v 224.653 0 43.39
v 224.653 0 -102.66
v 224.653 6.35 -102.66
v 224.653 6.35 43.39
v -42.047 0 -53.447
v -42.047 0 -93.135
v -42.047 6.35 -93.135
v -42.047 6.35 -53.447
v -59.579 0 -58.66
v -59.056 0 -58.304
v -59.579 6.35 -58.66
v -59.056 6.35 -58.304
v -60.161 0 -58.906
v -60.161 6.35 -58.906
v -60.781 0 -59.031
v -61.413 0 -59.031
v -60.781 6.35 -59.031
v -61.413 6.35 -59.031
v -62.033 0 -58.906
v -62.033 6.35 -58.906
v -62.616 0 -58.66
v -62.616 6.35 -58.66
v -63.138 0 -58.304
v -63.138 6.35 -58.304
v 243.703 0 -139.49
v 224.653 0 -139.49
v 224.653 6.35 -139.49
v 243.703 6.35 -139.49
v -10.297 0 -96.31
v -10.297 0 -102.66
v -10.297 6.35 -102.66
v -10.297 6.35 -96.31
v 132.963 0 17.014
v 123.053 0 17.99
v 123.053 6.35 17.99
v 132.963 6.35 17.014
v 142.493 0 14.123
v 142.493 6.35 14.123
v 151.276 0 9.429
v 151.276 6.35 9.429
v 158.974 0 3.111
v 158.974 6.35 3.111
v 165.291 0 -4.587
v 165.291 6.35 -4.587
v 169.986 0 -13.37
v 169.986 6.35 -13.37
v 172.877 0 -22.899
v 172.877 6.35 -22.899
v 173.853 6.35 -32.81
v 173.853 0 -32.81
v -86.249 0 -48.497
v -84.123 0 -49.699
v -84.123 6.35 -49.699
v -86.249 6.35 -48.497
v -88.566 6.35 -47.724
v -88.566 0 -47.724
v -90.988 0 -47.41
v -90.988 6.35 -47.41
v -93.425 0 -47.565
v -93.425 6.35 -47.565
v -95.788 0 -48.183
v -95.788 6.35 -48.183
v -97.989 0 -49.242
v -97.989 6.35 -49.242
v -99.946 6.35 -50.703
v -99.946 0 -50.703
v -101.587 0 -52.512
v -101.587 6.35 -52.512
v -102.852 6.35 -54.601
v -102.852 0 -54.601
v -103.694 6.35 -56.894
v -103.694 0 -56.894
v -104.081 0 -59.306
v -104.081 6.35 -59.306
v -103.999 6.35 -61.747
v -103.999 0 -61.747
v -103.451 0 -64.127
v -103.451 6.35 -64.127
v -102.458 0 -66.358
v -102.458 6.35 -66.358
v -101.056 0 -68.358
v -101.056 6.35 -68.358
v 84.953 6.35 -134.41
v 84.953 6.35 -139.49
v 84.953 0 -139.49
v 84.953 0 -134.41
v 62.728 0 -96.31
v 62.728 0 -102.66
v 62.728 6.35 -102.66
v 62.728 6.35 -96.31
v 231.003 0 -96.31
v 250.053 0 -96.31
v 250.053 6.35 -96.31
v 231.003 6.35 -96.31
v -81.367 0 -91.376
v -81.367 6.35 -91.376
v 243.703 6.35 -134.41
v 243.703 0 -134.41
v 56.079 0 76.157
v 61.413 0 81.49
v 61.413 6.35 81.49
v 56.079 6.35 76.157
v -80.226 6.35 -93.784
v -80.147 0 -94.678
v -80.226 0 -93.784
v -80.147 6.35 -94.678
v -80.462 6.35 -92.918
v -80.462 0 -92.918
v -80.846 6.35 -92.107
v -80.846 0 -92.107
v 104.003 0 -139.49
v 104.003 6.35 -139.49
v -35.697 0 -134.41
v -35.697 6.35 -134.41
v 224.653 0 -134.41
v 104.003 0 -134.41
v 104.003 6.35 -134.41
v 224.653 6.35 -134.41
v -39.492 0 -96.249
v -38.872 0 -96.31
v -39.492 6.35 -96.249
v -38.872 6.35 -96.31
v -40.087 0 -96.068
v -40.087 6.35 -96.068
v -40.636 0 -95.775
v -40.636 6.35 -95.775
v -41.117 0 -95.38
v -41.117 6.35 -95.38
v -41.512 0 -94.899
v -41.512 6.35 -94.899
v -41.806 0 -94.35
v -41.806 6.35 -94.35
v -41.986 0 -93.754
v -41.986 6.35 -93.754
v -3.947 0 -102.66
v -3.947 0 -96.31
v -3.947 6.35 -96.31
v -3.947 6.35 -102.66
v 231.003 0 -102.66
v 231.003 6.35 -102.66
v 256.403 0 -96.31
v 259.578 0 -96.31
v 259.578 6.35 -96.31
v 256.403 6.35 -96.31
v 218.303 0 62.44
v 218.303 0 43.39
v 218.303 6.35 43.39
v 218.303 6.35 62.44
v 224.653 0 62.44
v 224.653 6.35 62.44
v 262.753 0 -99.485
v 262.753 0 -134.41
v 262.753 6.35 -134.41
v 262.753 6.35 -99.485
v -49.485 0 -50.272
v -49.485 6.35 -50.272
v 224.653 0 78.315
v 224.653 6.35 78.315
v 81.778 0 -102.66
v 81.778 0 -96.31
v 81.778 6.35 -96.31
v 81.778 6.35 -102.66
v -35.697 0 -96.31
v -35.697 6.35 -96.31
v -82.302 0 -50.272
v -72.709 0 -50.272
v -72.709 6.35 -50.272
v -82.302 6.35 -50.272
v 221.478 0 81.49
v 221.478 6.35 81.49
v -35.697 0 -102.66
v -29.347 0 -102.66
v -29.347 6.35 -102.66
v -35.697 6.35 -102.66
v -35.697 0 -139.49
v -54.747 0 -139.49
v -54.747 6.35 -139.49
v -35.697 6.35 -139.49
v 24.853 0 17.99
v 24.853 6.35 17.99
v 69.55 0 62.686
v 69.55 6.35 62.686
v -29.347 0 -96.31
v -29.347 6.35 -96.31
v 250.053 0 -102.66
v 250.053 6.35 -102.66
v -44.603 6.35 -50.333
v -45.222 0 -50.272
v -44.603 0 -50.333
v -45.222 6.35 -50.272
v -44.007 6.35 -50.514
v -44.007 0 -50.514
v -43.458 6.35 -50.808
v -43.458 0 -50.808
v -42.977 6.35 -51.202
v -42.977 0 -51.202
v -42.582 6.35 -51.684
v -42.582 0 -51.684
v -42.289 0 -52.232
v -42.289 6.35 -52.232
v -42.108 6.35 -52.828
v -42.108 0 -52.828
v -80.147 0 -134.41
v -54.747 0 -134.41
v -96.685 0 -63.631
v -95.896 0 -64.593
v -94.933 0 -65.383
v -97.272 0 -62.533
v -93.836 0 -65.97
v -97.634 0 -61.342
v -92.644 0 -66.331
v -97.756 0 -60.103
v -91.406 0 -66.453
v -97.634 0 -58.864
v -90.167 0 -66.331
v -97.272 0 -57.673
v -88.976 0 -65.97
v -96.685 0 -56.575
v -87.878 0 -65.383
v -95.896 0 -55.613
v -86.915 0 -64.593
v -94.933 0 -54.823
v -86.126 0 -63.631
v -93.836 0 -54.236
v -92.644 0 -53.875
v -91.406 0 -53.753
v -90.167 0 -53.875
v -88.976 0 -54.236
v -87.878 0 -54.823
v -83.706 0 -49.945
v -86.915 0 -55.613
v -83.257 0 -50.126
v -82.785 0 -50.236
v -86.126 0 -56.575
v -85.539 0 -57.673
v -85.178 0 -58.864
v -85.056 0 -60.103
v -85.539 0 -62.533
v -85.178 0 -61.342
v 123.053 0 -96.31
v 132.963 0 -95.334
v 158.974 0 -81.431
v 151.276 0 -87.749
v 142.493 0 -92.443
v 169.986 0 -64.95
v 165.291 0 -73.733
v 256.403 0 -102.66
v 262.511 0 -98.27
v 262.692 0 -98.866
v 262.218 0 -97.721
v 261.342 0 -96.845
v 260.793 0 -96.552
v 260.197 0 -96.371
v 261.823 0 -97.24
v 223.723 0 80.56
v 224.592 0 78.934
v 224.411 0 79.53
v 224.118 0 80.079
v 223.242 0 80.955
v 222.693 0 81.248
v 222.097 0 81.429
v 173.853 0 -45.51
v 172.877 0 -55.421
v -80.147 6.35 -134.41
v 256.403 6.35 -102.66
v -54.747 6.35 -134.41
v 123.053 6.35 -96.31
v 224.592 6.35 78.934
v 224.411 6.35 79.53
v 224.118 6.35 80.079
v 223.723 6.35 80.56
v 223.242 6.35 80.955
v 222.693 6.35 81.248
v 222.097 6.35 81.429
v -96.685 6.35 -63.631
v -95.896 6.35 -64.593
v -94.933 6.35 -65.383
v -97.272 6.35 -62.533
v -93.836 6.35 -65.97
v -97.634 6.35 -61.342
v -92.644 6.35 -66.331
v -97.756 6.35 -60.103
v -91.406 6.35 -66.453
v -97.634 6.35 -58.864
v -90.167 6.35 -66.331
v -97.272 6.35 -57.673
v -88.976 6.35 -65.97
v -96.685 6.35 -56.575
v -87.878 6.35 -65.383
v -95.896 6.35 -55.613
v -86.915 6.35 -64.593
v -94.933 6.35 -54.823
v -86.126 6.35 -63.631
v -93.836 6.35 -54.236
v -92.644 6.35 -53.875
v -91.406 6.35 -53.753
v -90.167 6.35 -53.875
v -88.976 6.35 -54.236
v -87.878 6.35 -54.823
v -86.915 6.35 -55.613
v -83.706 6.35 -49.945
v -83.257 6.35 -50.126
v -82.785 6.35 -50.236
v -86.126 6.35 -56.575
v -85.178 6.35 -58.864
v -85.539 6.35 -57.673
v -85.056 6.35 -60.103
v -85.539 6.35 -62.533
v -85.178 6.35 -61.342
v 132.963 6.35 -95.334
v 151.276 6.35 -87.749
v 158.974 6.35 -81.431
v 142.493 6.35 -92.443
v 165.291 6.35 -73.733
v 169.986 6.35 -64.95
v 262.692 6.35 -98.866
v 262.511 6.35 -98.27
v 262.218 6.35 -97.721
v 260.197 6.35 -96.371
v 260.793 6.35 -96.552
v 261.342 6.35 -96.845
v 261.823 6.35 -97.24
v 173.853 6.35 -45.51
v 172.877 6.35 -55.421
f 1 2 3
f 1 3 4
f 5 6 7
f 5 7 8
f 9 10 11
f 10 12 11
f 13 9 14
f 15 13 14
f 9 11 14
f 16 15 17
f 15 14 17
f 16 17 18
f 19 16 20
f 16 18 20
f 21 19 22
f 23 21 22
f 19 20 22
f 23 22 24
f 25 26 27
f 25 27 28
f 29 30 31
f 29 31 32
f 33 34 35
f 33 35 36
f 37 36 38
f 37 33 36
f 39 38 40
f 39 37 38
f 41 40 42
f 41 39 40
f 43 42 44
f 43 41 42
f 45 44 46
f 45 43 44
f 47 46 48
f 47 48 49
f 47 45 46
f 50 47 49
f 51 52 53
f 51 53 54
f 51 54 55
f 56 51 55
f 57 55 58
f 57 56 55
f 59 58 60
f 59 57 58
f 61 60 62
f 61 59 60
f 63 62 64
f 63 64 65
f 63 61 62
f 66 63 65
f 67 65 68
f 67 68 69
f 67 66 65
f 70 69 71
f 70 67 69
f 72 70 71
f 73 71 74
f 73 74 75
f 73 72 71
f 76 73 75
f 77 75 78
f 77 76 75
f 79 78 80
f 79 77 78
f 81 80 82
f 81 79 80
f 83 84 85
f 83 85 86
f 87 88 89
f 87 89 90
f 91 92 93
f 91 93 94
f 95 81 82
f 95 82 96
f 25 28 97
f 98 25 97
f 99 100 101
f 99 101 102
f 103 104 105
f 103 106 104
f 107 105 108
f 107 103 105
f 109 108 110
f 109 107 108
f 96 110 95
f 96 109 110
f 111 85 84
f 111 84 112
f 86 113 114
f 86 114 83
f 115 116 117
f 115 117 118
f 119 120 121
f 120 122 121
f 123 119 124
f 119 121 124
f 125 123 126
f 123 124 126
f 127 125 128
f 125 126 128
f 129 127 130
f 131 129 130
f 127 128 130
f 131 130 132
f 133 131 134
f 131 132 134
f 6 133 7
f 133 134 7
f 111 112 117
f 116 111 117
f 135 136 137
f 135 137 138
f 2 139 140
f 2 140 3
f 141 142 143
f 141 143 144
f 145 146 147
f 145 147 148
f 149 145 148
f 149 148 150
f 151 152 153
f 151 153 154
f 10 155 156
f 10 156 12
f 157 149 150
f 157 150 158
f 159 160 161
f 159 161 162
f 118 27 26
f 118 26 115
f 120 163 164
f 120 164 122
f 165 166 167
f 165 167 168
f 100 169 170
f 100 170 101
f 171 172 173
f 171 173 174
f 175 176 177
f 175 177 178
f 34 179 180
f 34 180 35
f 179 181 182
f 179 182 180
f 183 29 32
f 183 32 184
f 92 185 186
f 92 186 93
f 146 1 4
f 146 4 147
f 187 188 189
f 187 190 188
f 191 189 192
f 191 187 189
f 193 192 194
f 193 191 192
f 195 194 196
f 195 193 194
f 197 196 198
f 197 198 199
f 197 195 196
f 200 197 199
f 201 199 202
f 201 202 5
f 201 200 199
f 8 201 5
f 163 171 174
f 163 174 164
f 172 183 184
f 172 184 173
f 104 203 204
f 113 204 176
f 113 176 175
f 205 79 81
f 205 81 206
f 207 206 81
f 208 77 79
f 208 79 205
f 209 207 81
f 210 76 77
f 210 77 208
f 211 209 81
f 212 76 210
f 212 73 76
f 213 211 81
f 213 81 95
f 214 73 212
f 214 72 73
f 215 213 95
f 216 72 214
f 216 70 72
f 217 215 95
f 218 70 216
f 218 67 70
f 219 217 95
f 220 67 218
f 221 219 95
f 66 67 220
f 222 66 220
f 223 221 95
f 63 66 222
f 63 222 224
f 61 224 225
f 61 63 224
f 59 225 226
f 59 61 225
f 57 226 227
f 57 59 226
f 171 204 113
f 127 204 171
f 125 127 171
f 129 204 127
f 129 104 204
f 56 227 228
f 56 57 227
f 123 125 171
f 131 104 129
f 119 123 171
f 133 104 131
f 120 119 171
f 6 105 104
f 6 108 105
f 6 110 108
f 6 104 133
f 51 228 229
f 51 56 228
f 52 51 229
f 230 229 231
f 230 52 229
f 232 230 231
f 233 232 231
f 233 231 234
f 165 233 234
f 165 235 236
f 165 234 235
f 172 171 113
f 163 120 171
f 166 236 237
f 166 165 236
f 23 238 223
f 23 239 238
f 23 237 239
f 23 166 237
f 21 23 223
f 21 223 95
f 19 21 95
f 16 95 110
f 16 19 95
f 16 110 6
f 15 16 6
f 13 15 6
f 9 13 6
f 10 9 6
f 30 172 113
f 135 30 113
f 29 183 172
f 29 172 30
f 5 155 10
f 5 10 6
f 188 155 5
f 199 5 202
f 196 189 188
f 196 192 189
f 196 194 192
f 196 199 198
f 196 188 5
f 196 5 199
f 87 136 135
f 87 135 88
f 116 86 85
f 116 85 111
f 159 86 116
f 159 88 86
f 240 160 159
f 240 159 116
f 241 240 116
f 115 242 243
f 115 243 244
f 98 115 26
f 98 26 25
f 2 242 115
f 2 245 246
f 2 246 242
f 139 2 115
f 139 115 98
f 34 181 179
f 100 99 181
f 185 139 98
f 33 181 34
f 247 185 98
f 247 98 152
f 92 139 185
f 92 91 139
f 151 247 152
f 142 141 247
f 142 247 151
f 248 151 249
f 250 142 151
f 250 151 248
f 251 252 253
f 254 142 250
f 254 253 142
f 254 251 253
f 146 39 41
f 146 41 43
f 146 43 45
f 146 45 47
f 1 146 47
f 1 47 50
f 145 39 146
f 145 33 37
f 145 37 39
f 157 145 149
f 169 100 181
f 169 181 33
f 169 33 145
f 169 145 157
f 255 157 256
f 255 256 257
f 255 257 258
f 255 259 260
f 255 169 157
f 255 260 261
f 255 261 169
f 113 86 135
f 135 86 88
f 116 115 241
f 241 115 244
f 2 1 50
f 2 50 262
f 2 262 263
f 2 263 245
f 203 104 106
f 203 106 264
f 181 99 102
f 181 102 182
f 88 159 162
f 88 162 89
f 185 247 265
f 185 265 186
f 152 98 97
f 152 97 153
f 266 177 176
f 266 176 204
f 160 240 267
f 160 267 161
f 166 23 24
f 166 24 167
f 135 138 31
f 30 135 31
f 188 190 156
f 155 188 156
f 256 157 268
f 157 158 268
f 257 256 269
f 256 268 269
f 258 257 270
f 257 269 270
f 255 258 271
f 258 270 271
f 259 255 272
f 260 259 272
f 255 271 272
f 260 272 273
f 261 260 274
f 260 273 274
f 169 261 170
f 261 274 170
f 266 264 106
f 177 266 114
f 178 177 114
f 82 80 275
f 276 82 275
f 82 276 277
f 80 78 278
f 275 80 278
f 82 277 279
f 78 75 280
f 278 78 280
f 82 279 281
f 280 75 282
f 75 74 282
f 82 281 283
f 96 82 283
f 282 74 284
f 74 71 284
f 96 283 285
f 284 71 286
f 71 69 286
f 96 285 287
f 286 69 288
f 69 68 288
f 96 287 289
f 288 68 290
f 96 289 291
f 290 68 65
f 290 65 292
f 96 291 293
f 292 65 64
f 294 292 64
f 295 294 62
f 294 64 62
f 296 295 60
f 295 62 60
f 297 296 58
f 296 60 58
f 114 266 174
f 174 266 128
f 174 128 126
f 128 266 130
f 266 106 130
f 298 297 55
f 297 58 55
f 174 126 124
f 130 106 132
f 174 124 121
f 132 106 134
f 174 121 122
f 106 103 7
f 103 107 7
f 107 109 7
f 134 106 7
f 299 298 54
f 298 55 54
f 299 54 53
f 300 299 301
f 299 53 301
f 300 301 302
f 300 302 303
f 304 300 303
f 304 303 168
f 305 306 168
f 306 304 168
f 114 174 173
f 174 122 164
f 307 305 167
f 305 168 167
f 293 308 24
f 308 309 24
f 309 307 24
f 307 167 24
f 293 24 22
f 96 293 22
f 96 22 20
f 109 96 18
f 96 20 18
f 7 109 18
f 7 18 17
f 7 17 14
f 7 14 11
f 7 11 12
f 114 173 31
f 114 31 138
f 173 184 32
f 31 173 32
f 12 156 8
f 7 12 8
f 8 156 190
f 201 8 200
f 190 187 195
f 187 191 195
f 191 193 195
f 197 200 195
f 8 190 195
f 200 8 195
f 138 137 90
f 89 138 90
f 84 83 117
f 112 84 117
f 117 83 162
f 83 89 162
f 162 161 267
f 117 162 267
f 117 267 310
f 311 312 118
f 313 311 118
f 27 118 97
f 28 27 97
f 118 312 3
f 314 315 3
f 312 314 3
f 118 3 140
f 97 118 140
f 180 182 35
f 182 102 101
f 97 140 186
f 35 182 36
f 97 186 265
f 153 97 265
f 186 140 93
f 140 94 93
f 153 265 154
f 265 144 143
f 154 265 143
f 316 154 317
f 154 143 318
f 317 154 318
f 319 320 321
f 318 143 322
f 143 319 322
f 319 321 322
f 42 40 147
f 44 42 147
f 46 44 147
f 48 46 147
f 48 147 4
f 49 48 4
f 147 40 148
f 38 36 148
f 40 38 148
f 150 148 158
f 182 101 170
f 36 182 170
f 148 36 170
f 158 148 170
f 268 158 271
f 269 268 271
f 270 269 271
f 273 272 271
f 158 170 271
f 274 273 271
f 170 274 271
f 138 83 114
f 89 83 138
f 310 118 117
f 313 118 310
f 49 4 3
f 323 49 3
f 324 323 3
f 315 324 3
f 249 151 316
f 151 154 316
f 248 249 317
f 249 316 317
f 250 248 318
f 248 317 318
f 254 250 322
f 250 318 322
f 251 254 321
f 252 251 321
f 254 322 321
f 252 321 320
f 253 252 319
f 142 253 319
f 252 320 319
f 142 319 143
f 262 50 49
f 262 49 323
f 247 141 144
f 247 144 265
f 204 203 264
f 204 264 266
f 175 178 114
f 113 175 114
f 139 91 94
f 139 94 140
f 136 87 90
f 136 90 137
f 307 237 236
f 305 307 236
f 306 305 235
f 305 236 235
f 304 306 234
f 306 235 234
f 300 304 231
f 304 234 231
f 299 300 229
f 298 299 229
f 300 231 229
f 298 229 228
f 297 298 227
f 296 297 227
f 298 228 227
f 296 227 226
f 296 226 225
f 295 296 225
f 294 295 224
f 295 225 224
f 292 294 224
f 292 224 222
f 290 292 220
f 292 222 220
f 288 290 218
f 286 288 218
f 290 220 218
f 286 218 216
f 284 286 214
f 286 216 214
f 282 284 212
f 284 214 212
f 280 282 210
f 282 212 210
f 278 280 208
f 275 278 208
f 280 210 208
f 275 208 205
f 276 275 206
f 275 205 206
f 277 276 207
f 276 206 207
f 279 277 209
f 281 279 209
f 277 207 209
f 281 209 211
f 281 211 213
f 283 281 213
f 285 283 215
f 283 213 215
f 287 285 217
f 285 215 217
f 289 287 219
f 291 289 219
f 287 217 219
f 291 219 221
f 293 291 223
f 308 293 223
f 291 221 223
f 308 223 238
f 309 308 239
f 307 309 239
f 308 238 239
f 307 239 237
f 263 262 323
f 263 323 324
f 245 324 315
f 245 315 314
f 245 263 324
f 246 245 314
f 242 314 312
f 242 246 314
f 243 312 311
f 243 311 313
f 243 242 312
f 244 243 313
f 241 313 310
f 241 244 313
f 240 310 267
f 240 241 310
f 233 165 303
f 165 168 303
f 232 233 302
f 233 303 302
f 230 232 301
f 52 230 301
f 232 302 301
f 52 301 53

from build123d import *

# Parameters (mm, degrees)
F0_R     = 6.35
F0_W     = 19.05
F0_H     = 5.08
F1_DEPTH = 6.35
F2_R     = 3.175
F3_R     = 5.08
F4_R     = 3.175
F5_R     = 3.175


# Not quite as in the source:
# - ends of sketch curves that miss each other by under 0.0002 mm in the source are joined


with BuildPart() as f1:
    # F0 (on Front) → F1 (new body)
    with BuildSketch(Plane.XZ):
        with BuildLine():
            Line((-72.7094654823, -50.272475262), (-83.3648741359, -50.272475262))
            ThreePointArc((-83.3648741359, -50.272475262), (-100.4842470659, -51.222143603), (-101.056400417, -68.3582903151))
            Line((-101.056400417, -68.3582903151), (-80.147210941, -92.8018072064))
            Line((-80.147210941, -92.8018072064), (-80.147210941, -134.409975262))
            Line((-80.147210941, -134.409975262), (-54.747210941, -134.409975262))
            Line((-54.747210941, -134.409975262), (-35.697210941, -134.409975262))
            Line((-35.697210941, -134.409975262), (84.952789059, -134.409975262))
            Line((84.952789059, -134.409975262), (104.002789059, -134.409975262))
            Line((104.002789059, -134.409975262), (224.652789059, -134.409975262))
            Line((224.652789059, -134.409975262), (243.702789059, -134.409975262))
            Line((243.702789059, -134.409975262), (262.752789059, -134.409975262))
            Line((262.752789059, -134.409975262), (262.752789059, -96.309975262))
            Line((262.752789059, -96.309975262), (256.402789059, -96.309975262))
            Line((256.402789059, -96.309975262), (256.402789059, -102.659975262))
            Line((256.402789059, -102.659975262), (250.052789059, -102.659975262))
            Line((250.052789059, -102.659975262), (250.052789059, -96.309975262))
            Line((250.052789059, -96.309975262), (231.002789059, -96.309975262))
            Line((231.002789059, -96.309975262), (231.002789059, -102.659975262))
            Line((231.002789059, -102.659975262), (224.652789059, -102.659975262))
            Line((224.652789059, -102.659975262), (224.652789059, 43.390024738))
            Line((224.652789059, 43.390024738), (218.302789059, 43.390024738))
            Line((218.302789059, 43.390024738), (218.302789059, 62.440024738))
            Line((218.302789059, 62.440024738), (224.652789059, 62.440024738))
            Line((224.652789059, 62.440024738), (224.652789059, 81.490024738))
            Line((224.652789059, 81.490024738), (61.4126609984, 81.490024738))
            Line((61.4126609984, 81.490024738), (56.0792184251, 76.1565821646))
            Line((56.0792184251, 76.1565821646), (69.5496026067, 62.686197983))
            Line((69.5496026067, 62.686197983), (24.8534293616, 17.990024738))
            Line((24.8534293616, 17.990024738), (123.052789059, 17.990024738))
            ThreePointArc((123.052789059, 17.990024738), (158.9738135432, 3.1110492223), (173.852789059, -32.809975262))
            Line((173.852789059, -32.809975262), (173.852789059, -45.509975262))
            ThreePointArc((173.852789059, -45.509975262), (158.9738135432, -81.4309997463), (123.052789059, -96.309975262))
            Line((123.052789059, -96.309975262), (81.777789059, -96.309975262))
            Line((81.777789059, -96.309975262), (81.777789059, -102.659975262))
            Line((81.777789059, -102.659975262), (62.727789059, -102.659975262))
            Line((62.727789059, -102.659975262), (62.727789059, -96.309975262))
            Line((62.727789059, -96.309975262), (-3.947210941, -96.309975262))
            Line((-3.947210941, -96.309975262), (-3.947210941, -102.659975262))
            Line((-3.947210941, -102.659975262), (-10.297210941, -102.659975262))
            Line((-10.297210941, -102.659975262), (-10.297210941, -96.309975262))
            Line((-10.297210941, -96.309975262), (-29.347210941, -96.309975262))
            Line((-29.347210941, -96.309975262), (-29.347210941, -102.659975262))
            Line((-29.347210941, -102.659975262), (-35.697210941, -102.659975262))
            Line((-35.697210941, -102.659975262), (-35.697210941, -96.309975262))
            Line((-35.697210941, -96.309975262), (-42.047210941, -96.309975262))
            Line((-42.047210941, -96.309975262), (-42.047210941, -50.272475262))
            Line((-42.047210941, -50.272475262), (-49.4849563998, -50.272475262))
            Line((-49.4849563998, -50.272475262), (-61.097210941, -60.0163137647))
            Line((-61.097210941, -60.0163137647), (-72.7094654823, -50.272475262))
        make_face()
        with Locations((-91.4055753496, -60.1028935639)):
            Circle(F0_R, mode=Mode.SUBTRACT)
        with Locations((-45.222210941, -136.949975262)):
            Rectangle(F0_W, F0_H)
        with Locations((94.477789059, -136.949975262)):
            Rectangle(F0_W, F0_H)
        with Locations((234.177789059, -136.949975262)):
            Rectangle(F0_W, F0_H)
    extrude(amount=-F1_DEPTH)

    # F2
    f2_edges = [f1.edges().sort_by_distance(p)[0] for p in [
        (224.652789, 3.175, 81.490025),
        (-42.047211, 3.175, -96.309975),
    ]]
    fillet(f2_edges, radius=F2_R)

    # F3
    f3_edges = [f1.edges().sort_by_distance(p)[0] for p in [
        (-80.147211, 3.175, -92.801807),
    ]]
    fillet(f3_edges, radius=F3_R)

    # F4
    f4_edges = [f1.edges().sort_by_distance(p)[0] for p in [
        (-42.047211, 3.175, -50.272475),
    ]]
    fillet(f4_edges, radius=F4_R)

    # F5
    f5_edges = [f1.edges().sort_by_distance(p)[0] for p in [
        (-61.097211, 3.175, -60.016314),
        (-83.364874, 3.175, -50.272475),
        (262.752789, 3.175, -96.309975),
    ]]
    fillet(f5_edges, radius=F5_R)


solid = f1.part
